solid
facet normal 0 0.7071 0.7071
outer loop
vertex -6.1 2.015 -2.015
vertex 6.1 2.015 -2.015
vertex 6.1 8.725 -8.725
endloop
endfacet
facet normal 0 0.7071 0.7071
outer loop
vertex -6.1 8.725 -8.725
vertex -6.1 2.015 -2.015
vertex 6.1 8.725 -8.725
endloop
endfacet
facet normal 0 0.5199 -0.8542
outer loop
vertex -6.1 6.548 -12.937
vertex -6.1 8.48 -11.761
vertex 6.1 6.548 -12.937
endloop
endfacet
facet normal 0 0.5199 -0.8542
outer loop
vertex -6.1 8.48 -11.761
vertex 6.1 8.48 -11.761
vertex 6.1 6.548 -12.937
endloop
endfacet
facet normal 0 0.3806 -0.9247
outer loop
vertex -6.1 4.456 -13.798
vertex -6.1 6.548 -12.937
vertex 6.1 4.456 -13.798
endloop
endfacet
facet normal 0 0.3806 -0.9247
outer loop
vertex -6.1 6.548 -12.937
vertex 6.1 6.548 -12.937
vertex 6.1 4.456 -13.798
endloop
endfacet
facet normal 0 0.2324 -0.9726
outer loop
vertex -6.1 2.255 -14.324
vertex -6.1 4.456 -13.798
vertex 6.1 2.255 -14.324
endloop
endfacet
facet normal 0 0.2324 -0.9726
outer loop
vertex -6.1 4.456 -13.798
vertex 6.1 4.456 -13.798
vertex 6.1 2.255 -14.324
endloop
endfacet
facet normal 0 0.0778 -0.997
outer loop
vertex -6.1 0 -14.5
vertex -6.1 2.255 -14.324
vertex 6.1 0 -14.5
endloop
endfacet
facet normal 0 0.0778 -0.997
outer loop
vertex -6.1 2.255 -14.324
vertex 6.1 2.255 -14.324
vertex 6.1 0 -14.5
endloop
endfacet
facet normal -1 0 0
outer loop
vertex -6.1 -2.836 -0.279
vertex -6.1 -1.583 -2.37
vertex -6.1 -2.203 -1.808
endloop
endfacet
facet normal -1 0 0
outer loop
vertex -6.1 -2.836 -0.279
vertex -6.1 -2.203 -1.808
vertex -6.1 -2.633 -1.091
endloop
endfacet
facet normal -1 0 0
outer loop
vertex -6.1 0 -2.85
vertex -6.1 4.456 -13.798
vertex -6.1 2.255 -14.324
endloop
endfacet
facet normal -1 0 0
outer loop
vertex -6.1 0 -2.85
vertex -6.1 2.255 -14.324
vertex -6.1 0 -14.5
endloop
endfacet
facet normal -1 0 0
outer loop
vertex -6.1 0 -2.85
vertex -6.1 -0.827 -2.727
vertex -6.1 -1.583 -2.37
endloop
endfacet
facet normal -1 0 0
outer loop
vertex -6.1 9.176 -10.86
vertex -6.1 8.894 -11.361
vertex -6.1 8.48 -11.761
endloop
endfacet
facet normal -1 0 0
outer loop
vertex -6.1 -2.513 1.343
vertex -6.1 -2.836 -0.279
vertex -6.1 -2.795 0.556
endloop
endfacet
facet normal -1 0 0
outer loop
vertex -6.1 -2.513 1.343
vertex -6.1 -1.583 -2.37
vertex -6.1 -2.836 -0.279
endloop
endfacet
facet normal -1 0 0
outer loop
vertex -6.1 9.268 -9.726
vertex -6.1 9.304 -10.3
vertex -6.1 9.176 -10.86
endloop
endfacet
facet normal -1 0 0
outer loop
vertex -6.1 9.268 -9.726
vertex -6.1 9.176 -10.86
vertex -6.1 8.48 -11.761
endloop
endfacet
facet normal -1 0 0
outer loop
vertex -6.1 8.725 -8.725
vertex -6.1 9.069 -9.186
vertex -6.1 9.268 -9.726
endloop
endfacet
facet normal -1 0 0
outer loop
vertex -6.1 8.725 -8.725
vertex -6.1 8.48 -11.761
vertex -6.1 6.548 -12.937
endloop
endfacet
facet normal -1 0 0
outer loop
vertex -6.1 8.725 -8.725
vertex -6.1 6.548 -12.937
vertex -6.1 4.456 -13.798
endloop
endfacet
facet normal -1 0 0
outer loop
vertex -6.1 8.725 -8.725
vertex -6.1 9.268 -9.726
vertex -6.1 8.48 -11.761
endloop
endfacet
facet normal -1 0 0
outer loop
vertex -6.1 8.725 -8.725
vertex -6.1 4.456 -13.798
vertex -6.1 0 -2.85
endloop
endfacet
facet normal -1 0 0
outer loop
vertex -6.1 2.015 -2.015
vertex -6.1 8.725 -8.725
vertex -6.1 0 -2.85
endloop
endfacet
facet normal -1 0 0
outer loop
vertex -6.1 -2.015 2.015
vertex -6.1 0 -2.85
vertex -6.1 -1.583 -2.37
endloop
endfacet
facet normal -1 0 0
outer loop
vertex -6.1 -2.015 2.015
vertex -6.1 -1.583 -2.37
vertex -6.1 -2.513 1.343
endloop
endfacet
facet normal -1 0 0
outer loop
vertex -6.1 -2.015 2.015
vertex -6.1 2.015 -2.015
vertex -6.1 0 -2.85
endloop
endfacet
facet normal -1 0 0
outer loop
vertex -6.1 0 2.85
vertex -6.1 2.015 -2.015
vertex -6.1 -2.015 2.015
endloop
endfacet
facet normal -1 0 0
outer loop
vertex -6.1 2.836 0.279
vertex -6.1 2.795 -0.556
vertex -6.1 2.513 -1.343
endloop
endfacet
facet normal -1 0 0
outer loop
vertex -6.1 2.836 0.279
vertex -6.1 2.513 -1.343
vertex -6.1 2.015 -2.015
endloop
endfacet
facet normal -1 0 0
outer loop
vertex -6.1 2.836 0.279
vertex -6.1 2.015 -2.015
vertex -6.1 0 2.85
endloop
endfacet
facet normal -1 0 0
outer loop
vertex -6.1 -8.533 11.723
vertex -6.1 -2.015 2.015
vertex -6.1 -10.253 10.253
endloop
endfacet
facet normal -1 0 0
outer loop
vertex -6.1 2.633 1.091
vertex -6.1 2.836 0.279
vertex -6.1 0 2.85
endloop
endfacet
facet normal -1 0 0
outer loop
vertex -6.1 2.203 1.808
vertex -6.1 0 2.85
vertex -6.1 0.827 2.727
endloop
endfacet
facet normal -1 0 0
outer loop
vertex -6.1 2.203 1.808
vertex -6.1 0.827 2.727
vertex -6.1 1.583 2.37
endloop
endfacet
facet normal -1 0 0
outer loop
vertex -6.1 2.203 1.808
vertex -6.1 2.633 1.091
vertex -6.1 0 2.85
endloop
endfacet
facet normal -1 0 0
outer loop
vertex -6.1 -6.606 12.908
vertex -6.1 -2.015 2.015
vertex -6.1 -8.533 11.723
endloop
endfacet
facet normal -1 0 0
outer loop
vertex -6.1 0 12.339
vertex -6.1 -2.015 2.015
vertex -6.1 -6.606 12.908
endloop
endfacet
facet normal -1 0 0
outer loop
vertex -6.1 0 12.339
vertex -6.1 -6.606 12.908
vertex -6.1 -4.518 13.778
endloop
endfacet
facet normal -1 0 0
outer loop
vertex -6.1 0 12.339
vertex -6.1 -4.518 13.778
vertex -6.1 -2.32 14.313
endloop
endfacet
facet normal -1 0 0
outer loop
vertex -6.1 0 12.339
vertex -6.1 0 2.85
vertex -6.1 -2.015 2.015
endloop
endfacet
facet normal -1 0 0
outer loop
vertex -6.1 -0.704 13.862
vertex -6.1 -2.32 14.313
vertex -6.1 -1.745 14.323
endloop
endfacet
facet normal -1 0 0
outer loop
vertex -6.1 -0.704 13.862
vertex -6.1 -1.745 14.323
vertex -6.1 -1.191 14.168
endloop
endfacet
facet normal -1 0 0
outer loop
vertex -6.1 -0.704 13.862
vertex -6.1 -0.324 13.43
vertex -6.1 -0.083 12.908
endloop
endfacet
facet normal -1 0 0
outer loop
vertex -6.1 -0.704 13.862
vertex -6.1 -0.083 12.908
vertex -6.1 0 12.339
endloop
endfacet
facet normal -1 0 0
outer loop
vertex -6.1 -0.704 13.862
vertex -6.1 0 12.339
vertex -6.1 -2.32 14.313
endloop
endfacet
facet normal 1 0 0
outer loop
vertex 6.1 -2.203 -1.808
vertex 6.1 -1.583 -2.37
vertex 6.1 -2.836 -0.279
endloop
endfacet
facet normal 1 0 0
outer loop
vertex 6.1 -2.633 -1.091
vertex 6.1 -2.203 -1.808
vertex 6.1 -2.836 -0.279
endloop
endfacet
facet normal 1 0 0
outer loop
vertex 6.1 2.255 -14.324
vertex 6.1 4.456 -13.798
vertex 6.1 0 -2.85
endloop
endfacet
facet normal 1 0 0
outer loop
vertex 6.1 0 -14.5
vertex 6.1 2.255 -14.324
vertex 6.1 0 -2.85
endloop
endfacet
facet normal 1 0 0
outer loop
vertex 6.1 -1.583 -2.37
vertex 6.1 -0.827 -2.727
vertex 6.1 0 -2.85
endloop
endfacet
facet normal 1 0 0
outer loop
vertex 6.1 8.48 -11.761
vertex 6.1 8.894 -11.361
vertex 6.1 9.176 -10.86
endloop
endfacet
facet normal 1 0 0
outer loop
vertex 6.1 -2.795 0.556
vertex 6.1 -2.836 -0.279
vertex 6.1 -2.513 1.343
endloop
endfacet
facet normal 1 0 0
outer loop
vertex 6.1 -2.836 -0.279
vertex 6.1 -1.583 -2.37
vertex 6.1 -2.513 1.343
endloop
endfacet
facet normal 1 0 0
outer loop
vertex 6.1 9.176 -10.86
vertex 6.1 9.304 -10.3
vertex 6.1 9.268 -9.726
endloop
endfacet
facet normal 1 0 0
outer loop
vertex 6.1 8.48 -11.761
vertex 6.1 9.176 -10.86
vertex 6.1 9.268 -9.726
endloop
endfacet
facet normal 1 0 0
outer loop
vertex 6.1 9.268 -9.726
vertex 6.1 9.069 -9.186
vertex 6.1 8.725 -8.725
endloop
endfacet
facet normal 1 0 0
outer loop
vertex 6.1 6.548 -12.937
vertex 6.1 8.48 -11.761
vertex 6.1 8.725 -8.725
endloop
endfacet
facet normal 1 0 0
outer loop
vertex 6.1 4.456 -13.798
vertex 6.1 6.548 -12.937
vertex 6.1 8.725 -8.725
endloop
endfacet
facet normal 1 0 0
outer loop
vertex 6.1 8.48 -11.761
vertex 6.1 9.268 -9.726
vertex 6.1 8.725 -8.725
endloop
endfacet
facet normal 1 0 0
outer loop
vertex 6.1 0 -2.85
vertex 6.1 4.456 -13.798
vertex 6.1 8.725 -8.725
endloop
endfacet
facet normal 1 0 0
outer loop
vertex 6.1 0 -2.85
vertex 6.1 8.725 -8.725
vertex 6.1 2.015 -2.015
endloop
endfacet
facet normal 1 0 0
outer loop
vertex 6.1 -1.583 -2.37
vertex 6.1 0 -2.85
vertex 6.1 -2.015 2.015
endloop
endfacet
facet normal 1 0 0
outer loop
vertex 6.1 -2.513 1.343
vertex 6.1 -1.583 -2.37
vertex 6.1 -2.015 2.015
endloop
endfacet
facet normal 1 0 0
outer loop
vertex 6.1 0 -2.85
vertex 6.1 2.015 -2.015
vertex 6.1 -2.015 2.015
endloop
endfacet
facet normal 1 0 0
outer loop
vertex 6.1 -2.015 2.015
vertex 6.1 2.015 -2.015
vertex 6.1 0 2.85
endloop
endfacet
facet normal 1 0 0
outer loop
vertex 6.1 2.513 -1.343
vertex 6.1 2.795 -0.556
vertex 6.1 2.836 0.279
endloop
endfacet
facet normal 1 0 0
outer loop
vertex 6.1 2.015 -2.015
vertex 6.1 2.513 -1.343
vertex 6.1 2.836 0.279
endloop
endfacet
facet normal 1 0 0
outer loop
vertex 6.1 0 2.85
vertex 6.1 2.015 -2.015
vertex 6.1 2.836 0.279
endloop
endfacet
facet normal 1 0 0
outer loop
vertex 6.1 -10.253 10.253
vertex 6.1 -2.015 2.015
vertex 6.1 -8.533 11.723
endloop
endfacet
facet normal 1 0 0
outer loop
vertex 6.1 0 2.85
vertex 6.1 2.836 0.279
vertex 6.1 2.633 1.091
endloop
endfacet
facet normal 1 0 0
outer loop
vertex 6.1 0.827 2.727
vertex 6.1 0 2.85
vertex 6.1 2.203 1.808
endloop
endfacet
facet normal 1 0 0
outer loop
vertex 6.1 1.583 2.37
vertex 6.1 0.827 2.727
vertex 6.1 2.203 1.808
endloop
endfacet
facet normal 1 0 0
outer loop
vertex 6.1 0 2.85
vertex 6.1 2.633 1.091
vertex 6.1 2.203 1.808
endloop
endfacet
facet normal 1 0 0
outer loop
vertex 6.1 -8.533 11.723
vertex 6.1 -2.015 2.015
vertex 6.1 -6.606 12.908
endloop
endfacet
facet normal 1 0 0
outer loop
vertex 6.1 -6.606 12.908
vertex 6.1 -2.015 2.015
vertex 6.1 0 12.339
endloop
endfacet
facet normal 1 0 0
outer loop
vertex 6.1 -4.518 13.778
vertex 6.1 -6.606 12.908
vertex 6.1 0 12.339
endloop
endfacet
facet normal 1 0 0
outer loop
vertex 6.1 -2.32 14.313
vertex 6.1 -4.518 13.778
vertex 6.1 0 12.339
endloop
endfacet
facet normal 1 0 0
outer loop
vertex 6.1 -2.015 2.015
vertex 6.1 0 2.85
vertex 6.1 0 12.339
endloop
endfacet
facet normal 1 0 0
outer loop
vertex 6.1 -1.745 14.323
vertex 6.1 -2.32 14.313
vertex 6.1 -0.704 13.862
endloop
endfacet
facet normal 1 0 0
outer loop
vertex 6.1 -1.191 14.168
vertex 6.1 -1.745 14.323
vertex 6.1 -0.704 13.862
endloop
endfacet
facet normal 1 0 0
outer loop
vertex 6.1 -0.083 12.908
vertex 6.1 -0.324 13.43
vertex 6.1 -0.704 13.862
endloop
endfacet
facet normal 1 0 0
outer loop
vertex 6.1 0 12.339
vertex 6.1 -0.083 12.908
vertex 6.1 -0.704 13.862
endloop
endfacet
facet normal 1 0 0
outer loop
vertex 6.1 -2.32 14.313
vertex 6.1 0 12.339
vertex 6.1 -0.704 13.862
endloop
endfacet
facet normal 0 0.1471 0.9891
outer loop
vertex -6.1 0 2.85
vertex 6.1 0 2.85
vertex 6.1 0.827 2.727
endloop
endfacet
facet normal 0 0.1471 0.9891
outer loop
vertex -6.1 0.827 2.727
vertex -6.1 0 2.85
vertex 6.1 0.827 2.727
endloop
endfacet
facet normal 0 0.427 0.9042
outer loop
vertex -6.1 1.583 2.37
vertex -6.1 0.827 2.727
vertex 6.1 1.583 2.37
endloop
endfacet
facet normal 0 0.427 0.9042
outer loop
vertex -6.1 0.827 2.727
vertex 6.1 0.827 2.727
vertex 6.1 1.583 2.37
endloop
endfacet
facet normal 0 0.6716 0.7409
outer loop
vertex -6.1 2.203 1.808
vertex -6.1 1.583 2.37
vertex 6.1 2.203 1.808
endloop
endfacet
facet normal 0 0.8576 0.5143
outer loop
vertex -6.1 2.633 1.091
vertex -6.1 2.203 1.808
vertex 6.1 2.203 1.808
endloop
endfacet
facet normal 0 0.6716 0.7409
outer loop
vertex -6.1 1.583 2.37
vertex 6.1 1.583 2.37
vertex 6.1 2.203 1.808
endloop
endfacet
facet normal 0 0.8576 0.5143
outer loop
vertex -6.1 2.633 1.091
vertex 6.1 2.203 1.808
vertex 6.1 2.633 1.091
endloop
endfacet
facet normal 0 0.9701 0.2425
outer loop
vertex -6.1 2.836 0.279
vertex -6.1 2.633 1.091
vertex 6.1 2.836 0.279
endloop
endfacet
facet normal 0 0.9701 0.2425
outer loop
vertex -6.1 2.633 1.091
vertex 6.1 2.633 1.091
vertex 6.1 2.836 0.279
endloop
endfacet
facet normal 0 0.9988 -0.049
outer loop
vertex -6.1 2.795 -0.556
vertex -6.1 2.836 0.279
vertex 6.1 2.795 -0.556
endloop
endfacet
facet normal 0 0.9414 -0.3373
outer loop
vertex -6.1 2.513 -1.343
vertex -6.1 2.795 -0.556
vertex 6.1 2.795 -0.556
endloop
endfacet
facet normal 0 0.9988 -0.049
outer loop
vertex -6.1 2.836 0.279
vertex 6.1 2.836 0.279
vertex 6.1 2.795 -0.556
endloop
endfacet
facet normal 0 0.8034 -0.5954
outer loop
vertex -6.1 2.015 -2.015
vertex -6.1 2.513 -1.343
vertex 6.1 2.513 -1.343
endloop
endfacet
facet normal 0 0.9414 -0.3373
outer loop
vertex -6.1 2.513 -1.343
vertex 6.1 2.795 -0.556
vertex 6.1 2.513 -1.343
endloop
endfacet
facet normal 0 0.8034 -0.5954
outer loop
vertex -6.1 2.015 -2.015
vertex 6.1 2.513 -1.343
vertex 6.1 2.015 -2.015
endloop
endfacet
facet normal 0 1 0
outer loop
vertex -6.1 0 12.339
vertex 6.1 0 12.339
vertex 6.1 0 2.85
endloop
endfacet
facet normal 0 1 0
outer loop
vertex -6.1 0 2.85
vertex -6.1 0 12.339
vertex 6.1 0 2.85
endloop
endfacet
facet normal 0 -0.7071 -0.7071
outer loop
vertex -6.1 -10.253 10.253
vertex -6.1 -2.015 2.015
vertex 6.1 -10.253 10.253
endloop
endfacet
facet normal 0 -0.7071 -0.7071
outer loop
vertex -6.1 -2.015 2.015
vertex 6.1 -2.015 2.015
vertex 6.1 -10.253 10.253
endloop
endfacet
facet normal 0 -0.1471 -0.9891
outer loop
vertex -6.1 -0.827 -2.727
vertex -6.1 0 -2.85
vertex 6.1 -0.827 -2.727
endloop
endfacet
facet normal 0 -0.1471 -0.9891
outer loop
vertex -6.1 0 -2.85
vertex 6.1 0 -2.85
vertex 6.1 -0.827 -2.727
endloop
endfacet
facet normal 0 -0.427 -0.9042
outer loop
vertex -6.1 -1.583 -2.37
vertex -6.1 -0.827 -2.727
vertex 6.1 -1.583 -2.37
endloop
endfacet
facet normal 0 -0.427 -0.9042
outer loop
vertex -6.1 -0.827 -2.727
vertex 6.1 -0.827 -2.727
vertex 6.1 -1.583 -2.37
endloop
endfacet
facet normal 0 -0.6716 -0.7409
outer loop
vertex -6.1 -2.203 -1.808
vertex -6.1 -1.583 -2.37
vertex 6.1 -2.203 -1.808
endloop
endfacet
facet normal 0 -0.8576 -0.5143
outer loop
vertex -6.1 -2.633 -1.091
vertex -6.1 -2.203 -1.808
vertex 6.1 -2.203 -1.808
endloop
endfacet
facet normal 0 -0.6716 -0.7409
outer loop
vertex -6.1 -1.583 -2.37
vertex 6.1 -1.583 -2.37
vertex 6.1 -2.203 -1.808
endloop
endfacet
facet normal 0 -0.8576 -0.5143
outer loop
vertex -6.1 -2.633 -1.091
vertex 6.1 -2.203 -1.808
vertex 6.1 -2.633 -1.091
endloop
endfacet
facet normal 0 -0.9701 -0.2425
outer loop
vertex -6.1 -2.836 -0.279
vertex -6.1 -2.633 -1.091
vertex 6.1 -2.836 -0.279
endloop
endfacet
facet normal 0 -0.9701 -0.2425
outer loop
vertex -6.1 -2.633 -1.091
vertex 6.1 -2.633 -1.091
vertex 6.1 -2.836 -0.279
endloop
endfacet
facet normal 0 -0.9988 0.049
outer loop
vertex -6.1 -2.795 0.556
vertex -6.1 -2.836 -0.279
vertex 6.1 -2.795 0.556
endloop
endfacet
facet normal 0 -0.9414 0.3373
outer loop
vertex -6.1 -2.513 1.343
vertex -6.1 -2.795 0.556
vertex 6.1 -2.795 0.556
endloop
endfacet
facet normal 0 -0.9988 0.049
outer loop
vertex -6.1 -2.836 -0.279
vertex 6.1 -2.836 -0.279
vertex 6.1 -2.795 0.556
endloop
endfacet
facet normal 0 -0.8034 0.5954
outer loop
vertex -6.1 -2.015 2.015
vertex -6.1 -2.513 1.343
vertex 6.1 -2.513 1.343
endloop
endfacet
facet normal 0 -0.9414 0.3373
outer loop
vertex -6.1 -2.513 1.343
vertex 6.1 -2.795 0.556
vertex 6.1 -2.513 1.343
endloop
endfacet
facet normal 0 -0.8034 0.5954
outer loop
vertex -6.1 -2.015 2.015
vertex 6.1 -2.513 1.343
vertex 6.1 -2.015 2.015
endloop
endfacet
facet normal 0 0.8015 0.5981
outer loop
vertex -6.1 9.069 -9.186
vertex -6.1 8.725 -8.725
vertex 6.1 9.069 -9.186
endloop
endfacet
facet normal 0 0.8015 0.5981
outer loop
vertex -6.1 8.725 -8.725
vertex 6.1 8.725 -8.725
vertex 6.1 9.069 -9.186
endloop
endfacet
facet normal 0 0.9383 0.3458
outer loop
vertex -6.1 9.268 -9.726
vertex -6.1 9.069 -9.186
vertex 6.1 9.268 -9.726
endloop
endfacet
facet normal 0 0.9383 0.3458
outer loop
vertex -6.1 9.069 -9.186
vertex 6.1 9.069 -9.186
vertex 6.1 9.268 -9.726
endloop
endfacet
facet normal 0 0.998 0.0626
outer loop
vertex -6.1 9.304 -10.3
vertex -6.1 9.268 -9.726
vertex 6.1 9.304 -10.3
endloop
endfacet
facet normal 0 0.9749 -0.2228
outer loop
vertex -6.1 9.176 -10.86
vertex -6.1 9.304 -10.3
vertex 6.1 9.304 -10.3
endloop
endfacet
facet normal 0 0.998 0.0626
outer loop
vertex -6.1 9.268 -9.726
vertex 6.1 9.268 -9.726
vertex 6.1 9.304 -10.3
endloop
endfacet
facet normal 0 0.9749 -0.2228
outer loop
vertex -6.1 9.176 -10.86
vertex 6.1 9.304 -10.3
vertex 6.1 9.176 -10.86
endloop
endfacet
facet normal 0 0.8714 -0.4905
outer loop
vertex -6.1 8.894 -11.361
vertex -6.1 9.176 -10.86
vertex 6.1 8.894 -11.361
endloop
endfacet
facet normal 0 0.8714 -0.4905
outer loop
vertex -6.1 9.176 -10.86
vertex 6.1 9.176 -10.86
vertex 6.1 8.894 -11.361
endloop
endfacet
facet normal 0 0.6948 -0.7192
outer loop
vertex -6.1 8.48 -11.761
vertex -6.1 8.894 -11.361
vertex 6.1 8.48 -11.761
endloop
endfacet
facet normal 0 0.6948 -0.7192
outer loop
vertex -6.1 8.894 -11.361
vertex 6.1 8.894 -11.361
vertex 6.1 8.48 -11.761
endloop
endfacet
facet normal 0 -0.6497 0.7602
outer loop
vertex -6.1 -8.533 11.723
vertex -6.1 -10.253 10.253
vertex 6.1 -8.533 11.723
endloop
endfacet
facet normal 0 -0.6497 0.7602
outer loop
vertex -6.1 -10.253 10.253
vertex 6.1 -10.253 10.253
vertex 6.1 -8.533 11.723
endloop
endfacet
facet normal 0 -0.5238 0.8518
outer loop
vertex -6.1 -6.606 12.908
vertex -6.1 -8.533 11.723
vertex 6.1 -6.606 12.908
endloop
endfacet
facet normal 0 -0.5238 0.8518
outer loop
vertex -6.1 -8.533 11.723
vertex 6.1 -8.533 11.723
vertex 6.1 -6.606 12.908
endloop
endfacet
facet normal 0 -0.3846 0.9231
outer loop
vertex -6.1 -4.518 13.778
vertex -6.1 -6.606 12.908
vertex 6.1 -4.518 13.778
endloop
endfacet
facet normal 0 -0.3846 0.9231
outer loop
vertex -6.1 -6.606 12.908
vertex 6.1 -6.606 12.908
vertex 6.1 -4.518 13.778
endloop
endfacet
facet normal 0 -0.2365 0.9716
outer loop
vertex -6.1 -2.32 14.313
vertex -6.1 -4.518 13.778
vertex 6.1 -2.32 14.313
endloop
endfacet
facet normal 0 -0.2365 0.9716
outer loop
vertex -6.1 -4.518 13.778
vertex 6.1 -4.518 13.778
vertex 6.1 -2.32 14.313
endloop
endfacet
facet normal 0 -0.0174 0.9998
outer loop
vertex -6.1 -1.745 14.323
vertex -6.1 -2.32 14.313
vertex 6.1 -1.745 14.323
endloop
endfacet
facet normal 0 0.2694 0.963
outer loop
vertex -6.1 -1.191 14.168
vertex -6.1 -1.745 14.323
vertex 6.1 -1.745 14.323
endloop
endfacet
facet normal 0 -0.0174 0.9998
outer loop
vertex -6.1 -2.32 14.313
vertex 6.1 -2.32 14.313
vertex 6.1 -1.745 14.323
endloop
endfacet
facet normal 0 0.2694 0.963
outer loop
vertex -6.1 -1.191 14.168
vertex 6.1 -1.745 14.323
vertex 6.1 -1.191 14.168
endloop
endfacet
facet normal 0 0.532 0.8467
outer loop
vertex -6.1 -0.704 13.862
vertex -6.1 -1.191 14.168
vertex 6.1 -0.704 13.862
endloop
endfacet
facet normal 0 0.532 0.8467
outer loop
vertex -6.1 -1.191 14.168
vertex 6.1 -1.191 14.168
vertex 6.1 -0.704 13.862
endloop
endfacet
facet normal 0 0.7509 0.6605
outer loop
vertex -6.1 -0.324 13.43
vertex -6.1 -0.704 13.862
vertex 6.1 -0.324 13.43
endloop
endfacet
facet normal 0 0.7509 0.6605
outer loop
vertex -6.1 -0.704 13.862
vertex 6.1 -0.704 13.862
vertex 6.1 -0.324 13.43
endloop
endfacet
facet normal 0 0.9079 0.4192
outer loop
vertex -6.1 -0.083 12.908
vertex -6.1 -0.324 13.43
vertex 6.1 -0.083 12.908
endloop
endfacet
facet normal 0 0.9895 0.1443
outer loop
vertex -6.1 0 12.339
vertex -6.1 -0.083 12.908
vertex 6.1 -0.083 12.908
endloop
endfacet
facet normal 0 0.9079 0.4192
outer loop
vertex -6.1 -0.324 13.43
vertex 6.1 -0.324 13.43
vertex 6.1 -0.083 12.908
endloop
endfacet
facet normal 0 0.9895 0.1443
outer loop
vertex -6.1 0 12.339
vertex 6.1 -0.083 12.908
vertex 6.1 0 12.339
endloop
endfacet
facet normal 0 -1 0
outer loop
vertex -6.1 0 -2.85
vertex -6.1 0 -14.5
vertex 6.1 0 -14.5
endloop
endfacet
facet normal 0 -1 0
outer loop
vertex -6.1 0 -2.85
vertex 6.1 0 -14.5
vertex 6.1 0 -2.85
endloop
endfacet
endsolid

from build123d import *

# Parameters (mm, degrees)
BOSS_EXTRUDE1_DEPTH = 6.1


with BuildPart() as part:
    # Sketch2 → Boss-Extrude1 (new, symmetric)
    with BuildSketch(Plane(origin=(0, 0, 0), x_dir=(0, 0, -1), z_dir=(1, 0, 0))):
        with BuildLine():
            Line((2.015254326, 2.015254326), (8.724964183, 8.724964183))
            ThreePointArc((8.724964183, 8.724964183), (10.299695568, 9.304298721), (11.761446185, 8.48047072))
            ThreePointArc((11.761446185, 8.48047072), (13.798387038, 4.455840567), (14.5, 0))
            Line((14.5, 0), (2.85, 0))
            ThreePointArc((2.85, 0), (1.090647782, -2.633056668), (-2.015254326, -2.015254326))
            Line((-2.015254326, -2.015254326), (-10.253048327, -10.253048327))
            ThreePointArc((-10.253048327, -10.253048327), (-12.907688125, -6.606177963), (-14.313196708, -2.32))
            ThreePointArc((-14.313196708, -2.32), (-13.8621173, -0.70385186), (-12.338962679, 0))
            Line((-12.338962679, 0), (-2.85, 0))
            ThreePointArc((-2.85, 0), (-1.090647782, 2.633056668), (2.015254326, 2.015254326))
        make_face()
    extrude(amount=BOSS_EXTRUDE1_DEPTH, both=True)


solid = part.part
